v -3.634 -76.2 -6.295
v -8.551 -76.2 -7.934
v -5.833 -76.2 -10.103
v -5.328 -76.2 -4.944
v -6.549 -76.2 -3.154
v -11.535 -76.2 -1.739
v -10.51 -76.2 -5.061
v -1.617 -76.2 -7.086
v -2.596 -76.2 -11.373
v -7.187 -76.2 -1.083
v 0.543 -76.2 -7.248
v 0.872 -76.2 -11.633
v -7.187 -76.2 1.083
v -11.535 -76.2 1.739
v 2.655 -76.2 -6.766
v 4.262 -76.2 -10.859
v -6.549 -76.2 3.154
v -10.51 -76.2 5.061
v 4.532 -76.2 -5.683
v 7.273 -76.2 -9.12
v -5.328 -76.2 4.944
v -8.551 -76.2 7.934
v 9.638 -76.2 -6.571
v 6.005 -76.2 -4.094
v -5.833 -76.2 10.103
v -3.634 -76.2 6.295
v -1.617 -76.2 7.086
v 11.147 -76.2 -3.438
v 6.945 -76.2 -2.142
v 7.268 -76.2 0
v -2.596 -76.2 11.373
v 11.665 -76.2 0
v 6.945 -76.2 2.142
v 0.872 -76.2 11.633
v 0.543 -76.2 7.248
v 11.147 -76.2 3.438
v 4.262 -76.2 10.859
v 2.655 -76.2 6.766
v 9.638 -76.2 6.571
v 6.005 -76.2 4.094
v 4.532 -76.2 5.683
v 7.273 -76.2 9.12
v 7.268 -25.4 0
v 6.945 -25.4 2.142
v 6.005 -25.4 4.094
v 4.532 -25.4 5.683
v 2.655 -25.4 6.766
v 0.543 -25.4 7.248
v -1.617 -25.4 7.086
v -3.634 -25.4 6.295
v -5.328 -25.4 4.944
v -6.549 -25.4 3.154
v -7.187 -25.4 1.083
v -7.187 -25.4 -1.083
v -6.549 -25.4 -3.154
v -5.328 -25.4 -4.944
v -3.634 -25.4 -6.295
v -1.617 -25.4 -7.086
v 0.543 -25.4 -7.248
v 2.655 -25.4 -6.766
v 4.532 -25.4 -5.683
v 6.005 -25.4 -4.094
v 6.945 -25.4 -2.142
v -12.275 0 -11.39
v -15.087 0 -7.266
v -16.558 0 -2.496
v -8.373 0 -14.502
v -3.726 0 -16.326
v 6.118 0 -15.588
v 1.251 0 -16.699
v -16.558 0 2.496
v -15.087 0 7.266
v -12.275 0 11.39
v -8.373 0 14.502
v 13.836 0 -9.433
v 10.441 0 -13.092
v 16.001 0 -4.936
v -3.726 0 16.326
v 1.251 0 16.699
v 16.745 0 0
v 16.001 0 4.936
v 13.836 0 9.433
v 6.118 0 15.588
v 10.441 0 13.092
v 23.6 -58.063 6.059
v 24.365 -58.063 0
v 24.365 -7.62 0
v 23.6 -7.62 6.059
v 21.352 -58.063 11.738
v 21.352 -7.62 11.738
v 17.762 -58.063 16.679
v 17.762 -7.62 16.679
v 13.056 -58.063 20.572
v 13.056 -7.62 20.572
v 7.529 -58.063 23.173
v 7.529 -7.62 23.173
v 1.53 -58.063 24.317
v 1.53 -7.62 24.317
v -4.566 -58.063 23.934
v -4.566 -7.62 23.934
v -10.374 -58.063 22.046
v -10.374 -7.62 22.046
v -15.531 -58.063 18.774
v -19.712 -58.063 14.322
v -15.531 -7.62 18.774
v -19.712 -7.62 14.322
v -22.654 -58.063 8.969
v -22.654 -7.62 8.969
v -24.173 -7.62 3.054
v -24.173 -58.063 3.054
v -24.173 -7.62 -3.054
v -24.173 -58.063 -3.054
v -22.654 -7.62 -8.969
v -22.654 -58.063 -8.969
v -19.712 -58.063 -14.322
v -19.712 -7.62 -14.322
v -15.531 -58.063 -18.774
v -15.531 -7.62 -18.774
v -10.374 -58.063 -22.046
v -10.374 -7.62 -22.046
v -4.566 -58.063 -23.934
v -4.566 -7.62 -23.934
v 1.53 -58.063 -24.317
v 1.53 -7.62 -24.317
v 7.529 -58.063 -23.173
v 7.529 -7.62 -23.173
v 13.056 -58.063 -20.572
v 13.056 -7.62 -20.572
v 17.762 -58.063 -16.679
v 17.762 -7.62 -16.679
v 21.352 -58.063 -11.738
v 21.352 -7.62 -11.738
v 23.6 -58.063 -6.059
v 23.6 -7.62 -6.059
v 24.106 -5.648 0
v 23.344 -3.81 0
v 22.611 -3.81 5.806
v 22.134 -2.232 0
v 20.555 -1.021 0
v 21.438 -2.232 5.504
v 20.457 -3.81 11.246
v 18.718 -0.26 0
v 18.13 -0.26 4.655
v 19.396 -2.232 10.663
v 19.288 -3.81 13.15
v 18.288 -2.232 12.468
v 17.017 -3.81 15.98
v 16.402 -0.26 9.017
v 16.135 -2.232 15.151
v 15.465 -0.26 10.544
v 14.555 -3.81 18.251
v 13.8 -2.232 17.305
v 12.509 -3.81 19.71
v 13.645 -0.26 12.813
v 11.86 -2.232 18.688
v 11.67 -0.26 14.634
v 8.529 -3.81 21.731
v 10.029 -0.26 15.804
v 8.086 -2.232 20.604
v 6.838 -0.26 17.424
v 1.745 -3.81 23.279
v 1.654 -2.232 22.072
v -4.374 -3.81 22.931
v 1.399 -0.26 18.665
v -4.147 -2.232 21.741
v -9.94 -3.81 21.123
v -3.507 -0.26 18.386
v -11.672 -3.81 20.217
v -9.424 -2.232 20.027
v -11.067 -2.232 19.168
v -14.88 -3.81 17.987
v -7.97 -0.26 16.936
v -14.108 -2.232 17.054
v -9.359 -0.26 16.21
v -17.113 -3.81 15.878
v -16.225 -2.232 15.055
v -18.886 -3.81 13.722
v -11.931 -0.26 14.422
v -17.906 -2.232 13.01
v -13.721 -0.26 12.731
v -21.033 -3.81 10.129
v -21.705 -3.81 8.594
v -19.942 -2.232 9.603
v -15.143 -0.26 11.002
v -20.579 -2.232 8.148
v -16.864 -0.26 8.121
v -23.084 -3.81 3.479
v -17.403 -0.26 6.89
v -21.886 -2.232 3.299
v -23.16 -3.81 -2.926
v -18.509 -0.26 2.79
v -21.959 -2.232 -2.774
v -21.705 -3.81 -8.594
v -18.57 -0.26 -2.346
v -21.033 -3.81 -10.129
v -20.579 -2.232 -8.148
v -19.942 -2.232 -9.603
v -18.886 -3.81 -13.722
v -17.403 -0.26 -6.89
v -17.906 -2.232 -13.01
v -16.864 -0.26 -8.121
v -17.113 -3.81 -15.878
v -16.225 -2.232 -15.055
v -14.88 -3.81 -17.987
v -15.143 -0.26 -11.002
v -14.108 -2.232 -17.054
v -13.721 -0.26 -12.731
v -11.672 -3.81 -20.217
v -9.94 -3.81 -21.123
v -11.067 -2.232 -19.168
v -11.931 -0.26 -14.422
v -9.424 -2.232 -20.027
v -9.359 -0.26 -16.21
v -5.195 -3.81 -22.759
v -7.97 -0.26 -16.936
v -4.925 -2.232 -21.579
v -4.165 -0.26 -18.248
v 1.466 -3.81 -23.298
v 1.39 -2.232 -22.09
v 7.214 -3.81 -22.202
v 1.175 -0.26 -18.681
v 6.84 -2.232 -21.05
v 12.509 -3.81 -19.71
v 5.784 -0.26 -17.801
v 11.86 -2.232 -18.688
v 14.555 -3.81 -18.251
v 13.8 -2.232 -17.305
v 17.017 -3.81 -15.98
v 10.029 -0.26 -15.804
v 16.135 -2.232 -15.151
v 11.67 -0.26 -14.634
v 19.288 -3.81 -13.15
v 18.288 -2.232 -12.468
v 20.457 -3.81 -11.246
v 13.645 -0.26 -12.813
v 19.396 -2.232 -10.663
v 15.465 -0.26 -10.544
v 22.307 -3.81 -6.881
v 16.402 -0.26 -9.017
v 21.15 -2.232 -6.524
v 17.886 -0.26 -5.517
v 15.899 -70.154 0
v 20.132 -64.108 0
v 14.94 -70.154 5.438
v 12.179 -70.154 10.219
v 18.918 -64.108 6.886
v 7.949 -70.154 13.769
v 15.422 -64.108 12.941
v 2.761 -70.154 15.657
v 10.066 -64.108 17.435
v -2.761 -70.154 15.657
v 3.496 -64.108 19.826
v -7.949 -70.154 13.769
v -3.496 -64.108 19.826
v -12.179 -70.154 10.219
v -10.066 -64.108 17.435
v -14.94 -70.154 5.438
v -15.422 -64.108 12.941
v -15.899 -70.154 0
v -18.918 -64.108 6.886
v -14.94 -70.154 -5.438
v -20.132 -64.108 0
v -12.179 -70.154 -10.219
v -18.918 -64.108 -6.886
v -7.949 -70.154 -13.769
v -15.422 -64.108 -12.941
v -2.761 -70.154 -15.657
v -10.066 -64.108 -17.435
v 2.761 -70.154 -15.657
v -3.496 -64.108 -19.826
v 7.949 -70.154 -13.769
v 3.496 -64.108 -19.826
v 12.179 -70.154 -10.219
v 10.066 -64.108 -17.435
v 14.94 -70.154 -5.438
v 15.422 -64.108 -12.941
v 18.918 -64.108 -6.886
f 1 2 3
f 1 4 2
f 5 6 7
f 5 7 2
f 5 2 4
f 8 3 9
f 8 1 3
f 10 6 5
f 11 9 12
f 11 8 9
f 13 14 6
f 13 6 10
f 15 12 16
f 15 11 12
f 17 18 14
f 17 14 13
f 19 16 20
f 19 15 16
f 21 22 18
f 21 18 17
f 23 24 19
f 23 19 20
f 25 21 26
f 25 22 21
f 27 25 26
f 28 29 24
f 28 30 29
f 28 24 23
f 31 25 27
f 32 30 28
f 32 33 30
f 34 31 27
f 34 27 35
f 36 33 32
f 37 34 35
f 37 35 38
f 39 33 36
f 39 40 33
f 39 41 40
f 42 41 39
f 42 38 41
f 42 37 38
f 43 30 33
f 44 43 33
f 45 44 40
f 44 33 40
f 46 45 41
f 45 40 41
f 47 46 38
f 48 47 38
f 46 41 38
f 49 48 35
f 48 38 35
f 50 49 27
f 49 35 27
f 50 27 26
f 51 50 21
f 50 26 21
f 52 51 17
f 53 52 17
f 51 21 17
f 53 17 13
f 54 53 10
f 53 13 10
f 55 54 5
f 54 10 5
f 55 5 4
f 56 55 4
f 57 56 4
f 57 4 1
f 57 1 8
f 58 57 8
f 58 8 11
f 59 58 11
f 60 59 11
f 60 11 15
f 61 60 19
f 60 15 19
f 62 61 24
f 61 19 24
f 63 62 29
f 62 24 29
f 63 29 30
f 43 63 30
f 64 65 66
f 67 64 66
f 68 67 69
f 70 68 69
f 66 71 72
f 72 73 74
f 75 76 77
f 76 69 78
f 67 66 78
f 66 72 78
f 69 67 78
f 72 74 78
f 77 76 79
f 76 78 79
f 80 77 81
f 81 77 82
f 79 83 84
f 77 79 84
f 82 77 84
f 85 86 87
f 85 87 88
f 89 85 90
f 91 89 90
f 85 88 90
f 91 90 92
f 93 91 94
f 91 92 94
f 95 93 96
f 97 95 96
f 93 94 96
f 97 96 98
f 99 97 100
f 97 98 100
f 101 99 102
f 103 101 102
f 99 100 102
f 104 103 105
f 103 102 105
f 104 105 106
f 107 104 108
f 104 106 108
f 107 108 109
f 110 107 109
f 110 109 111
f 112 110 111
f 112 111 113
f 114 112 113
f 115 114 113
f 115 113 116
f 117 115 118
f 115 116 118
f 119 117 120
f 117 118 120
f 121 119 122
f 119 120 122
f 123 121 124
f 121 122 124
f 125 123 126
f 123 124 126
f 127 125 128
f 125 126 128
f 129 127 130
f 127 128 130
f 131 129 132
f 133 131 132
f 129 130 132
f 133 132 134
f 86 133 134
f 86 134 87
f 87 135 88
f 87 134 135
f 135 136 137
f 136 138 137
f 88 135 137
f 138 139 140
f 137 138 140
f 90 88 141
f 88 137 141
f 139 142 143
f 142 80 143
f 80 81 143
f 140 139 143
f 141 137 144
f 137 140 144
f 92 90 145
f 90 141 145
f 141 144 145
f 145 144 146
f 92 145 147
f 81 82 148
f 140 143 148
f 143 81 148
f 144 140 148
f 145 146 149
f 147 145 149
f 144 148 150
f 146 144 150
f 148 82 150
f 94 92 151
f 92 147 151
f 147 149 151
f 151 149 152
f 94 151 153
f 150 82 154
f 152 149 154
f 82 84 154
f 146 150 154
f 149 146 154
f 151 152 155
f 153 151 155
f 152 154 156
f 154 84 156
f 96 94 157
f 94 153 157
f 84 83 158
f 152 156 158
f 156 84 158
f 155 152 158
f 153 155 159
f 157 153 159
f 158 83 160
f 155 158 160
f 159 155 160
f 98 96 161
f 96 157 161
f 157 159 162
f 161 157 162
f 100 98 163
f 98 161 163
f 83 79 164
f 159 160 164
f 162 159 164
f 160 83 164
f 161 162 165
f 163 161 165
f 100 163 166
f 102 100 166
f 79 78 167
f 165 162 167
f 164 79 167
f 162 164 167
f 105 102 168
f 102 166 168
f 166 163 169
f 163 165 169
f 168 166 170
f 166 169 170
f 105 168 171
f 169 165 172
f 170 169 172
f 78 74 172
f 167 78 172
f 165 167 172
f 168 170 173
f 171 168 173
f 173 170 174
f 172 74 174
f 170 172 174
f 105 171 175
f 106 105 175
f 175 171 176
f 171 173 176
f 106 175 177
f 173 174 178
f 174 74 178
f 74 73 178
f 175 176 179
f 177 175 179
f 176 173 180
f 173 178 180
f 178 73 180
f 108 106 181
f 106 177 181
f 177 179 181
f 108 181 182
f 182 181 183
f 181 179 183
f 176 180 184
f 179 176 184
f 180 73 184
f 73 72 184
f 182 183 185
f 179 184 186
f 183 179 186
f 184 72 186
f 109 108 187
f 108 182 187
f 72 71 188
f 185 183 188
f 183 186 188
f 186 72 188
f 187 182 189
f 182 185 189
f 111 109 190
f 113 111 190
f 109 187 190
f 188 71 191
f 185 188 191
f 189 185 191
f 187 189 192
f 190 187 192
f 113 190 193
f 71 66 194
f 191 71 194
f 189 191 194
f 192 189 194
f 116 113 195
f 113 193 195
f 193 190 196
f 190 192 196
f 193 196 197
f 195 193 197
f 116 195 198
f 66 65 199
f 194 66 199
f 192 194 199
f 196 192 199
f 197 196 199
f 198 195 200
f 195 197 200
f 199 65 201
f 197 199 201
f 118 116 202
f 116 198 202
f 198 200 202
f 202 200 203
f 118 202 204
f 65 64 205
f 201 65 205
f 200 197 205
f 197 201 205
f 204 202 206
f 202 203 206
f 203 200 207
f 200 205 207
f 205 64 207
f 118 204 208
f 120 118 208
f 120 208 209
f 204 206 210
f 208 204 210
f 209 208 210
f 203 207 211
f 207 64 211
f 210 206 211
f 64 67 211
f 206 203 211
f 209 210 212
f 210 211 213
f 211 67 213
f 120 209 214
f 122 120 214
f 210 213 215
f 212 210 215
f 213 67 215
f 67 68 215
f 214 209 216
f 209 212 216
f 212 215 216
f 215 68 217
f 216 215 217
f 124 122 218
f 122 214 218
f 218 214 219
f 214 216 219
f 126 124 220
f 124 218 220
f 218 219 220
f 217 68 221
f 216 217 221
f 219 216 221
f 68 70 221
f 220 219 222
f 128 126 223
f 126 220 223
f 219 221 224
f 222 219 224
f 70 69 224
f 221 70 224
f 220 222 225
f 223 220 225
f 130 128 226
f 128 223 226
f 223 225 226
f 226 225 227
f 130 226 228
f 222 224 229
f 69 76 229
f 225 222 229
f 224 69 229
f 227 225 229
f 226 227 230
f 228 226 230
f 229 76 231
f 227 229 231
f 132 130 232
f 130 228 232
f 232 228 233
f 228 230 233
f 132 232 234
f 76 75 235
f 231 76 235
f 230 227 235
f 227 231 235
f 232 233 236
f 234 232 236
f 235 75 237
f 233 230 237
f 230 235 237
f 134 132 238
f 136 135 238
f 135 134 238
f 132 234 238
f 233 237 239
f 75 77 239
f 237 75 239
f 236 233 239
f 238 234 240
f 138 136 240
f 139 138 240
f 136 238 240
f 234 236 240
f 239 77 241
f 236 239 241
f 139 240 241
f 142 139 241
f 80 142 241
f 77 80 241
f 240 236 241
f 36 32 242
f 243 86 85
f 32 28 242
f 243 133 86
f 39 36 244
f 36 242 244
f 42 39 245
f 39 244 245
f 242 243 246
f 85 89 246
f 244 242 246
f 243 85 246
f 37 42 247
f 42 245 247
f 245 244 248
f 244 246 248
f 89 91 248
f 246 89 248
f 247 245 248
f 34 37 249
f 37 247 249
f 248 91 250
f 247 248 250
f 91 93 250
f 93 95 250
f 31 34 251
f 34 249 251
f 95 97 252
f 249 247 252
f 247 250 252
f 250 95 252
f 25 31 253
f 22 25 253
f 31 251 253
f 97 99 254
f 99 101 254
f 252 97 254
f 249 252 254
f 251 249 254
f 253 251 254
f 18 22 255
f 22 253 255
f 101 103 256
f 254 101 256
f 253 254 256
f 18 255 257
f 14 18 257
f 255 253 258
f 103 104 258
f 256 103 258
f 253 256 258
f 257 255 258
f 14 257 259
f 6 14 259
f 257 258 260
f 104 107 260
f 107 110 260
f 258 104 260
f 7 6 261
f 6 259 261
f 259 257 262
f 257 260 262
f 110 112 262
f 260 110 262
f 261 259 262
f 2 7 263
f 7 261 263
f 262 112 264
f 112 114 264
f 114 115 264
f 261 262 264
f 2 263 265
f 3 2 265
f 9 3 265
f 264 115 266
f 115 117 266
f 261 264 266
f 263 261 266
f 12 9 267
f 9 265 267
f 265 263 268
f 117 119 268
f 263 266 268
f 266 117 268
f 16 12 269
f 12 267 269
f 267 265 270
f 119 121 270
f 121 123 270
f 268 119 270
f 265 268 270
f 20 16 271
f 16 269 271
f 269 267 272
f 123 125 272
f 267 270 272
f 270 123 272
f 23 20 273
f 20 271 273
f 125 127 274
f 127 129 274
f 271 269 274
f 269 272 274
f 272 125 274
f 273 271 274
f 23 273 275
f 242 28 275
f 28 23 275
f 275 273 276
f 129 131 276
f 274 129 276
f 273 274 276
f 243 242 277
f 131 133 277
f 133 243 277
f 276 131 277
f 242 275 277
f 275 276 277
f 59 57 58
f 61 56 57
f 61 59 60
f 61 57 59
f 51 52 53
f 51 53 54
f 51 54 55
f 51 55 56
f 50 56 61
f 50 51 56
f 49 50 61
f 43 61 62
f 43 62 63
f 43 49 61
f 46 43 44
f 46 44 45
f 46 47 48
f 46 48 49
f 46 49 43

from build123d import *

# Parameters (mm, degrees)
F0_R     = 24.3653753529
F1_DEPTH = 76.2
F2_R     = 7.62
F3_R     = 7.2684002017
F4_DEPTH = 50.8
F5_SIZE2 = 18.1374796856
F5_SIZE  = 12.7


with BuildPart() as f1:
    # F0 (on Front) → F1 (new body)
    with BuildSketch(Plane.XZ):
        Circle(F0_R)
    extrude(amount=F1_DEPTH)

    # F2
    f2_edges = [f1.edges().sort_by_distance(p)[0] for p in [
        (-24.365375, 0, 0),
    ]]
    fillet(f2_edges, radius=F2_R)

    # F3 (on face) → F4 (cut)
    with BuildSketch(Plane.XZ.offset(76.2)):
        Circle(F3_R)
    extrude(amount=-F4_DEPTH, mode=Mode.SUBTRACT)

    # F5
    f5_edges = [f1.edges().sort_by_distance(p)[0] for p in [
        (-24.365375, -76.2, 0),
    ]]
    f5_side = f1.faces().sort_by_distance((-23.676218, -76.2, 0))[0]
    chamfer(f5_edges, length=F5_SIZE, length2=F5_SIZE2, reference=f5_side)


solid = f1.part
